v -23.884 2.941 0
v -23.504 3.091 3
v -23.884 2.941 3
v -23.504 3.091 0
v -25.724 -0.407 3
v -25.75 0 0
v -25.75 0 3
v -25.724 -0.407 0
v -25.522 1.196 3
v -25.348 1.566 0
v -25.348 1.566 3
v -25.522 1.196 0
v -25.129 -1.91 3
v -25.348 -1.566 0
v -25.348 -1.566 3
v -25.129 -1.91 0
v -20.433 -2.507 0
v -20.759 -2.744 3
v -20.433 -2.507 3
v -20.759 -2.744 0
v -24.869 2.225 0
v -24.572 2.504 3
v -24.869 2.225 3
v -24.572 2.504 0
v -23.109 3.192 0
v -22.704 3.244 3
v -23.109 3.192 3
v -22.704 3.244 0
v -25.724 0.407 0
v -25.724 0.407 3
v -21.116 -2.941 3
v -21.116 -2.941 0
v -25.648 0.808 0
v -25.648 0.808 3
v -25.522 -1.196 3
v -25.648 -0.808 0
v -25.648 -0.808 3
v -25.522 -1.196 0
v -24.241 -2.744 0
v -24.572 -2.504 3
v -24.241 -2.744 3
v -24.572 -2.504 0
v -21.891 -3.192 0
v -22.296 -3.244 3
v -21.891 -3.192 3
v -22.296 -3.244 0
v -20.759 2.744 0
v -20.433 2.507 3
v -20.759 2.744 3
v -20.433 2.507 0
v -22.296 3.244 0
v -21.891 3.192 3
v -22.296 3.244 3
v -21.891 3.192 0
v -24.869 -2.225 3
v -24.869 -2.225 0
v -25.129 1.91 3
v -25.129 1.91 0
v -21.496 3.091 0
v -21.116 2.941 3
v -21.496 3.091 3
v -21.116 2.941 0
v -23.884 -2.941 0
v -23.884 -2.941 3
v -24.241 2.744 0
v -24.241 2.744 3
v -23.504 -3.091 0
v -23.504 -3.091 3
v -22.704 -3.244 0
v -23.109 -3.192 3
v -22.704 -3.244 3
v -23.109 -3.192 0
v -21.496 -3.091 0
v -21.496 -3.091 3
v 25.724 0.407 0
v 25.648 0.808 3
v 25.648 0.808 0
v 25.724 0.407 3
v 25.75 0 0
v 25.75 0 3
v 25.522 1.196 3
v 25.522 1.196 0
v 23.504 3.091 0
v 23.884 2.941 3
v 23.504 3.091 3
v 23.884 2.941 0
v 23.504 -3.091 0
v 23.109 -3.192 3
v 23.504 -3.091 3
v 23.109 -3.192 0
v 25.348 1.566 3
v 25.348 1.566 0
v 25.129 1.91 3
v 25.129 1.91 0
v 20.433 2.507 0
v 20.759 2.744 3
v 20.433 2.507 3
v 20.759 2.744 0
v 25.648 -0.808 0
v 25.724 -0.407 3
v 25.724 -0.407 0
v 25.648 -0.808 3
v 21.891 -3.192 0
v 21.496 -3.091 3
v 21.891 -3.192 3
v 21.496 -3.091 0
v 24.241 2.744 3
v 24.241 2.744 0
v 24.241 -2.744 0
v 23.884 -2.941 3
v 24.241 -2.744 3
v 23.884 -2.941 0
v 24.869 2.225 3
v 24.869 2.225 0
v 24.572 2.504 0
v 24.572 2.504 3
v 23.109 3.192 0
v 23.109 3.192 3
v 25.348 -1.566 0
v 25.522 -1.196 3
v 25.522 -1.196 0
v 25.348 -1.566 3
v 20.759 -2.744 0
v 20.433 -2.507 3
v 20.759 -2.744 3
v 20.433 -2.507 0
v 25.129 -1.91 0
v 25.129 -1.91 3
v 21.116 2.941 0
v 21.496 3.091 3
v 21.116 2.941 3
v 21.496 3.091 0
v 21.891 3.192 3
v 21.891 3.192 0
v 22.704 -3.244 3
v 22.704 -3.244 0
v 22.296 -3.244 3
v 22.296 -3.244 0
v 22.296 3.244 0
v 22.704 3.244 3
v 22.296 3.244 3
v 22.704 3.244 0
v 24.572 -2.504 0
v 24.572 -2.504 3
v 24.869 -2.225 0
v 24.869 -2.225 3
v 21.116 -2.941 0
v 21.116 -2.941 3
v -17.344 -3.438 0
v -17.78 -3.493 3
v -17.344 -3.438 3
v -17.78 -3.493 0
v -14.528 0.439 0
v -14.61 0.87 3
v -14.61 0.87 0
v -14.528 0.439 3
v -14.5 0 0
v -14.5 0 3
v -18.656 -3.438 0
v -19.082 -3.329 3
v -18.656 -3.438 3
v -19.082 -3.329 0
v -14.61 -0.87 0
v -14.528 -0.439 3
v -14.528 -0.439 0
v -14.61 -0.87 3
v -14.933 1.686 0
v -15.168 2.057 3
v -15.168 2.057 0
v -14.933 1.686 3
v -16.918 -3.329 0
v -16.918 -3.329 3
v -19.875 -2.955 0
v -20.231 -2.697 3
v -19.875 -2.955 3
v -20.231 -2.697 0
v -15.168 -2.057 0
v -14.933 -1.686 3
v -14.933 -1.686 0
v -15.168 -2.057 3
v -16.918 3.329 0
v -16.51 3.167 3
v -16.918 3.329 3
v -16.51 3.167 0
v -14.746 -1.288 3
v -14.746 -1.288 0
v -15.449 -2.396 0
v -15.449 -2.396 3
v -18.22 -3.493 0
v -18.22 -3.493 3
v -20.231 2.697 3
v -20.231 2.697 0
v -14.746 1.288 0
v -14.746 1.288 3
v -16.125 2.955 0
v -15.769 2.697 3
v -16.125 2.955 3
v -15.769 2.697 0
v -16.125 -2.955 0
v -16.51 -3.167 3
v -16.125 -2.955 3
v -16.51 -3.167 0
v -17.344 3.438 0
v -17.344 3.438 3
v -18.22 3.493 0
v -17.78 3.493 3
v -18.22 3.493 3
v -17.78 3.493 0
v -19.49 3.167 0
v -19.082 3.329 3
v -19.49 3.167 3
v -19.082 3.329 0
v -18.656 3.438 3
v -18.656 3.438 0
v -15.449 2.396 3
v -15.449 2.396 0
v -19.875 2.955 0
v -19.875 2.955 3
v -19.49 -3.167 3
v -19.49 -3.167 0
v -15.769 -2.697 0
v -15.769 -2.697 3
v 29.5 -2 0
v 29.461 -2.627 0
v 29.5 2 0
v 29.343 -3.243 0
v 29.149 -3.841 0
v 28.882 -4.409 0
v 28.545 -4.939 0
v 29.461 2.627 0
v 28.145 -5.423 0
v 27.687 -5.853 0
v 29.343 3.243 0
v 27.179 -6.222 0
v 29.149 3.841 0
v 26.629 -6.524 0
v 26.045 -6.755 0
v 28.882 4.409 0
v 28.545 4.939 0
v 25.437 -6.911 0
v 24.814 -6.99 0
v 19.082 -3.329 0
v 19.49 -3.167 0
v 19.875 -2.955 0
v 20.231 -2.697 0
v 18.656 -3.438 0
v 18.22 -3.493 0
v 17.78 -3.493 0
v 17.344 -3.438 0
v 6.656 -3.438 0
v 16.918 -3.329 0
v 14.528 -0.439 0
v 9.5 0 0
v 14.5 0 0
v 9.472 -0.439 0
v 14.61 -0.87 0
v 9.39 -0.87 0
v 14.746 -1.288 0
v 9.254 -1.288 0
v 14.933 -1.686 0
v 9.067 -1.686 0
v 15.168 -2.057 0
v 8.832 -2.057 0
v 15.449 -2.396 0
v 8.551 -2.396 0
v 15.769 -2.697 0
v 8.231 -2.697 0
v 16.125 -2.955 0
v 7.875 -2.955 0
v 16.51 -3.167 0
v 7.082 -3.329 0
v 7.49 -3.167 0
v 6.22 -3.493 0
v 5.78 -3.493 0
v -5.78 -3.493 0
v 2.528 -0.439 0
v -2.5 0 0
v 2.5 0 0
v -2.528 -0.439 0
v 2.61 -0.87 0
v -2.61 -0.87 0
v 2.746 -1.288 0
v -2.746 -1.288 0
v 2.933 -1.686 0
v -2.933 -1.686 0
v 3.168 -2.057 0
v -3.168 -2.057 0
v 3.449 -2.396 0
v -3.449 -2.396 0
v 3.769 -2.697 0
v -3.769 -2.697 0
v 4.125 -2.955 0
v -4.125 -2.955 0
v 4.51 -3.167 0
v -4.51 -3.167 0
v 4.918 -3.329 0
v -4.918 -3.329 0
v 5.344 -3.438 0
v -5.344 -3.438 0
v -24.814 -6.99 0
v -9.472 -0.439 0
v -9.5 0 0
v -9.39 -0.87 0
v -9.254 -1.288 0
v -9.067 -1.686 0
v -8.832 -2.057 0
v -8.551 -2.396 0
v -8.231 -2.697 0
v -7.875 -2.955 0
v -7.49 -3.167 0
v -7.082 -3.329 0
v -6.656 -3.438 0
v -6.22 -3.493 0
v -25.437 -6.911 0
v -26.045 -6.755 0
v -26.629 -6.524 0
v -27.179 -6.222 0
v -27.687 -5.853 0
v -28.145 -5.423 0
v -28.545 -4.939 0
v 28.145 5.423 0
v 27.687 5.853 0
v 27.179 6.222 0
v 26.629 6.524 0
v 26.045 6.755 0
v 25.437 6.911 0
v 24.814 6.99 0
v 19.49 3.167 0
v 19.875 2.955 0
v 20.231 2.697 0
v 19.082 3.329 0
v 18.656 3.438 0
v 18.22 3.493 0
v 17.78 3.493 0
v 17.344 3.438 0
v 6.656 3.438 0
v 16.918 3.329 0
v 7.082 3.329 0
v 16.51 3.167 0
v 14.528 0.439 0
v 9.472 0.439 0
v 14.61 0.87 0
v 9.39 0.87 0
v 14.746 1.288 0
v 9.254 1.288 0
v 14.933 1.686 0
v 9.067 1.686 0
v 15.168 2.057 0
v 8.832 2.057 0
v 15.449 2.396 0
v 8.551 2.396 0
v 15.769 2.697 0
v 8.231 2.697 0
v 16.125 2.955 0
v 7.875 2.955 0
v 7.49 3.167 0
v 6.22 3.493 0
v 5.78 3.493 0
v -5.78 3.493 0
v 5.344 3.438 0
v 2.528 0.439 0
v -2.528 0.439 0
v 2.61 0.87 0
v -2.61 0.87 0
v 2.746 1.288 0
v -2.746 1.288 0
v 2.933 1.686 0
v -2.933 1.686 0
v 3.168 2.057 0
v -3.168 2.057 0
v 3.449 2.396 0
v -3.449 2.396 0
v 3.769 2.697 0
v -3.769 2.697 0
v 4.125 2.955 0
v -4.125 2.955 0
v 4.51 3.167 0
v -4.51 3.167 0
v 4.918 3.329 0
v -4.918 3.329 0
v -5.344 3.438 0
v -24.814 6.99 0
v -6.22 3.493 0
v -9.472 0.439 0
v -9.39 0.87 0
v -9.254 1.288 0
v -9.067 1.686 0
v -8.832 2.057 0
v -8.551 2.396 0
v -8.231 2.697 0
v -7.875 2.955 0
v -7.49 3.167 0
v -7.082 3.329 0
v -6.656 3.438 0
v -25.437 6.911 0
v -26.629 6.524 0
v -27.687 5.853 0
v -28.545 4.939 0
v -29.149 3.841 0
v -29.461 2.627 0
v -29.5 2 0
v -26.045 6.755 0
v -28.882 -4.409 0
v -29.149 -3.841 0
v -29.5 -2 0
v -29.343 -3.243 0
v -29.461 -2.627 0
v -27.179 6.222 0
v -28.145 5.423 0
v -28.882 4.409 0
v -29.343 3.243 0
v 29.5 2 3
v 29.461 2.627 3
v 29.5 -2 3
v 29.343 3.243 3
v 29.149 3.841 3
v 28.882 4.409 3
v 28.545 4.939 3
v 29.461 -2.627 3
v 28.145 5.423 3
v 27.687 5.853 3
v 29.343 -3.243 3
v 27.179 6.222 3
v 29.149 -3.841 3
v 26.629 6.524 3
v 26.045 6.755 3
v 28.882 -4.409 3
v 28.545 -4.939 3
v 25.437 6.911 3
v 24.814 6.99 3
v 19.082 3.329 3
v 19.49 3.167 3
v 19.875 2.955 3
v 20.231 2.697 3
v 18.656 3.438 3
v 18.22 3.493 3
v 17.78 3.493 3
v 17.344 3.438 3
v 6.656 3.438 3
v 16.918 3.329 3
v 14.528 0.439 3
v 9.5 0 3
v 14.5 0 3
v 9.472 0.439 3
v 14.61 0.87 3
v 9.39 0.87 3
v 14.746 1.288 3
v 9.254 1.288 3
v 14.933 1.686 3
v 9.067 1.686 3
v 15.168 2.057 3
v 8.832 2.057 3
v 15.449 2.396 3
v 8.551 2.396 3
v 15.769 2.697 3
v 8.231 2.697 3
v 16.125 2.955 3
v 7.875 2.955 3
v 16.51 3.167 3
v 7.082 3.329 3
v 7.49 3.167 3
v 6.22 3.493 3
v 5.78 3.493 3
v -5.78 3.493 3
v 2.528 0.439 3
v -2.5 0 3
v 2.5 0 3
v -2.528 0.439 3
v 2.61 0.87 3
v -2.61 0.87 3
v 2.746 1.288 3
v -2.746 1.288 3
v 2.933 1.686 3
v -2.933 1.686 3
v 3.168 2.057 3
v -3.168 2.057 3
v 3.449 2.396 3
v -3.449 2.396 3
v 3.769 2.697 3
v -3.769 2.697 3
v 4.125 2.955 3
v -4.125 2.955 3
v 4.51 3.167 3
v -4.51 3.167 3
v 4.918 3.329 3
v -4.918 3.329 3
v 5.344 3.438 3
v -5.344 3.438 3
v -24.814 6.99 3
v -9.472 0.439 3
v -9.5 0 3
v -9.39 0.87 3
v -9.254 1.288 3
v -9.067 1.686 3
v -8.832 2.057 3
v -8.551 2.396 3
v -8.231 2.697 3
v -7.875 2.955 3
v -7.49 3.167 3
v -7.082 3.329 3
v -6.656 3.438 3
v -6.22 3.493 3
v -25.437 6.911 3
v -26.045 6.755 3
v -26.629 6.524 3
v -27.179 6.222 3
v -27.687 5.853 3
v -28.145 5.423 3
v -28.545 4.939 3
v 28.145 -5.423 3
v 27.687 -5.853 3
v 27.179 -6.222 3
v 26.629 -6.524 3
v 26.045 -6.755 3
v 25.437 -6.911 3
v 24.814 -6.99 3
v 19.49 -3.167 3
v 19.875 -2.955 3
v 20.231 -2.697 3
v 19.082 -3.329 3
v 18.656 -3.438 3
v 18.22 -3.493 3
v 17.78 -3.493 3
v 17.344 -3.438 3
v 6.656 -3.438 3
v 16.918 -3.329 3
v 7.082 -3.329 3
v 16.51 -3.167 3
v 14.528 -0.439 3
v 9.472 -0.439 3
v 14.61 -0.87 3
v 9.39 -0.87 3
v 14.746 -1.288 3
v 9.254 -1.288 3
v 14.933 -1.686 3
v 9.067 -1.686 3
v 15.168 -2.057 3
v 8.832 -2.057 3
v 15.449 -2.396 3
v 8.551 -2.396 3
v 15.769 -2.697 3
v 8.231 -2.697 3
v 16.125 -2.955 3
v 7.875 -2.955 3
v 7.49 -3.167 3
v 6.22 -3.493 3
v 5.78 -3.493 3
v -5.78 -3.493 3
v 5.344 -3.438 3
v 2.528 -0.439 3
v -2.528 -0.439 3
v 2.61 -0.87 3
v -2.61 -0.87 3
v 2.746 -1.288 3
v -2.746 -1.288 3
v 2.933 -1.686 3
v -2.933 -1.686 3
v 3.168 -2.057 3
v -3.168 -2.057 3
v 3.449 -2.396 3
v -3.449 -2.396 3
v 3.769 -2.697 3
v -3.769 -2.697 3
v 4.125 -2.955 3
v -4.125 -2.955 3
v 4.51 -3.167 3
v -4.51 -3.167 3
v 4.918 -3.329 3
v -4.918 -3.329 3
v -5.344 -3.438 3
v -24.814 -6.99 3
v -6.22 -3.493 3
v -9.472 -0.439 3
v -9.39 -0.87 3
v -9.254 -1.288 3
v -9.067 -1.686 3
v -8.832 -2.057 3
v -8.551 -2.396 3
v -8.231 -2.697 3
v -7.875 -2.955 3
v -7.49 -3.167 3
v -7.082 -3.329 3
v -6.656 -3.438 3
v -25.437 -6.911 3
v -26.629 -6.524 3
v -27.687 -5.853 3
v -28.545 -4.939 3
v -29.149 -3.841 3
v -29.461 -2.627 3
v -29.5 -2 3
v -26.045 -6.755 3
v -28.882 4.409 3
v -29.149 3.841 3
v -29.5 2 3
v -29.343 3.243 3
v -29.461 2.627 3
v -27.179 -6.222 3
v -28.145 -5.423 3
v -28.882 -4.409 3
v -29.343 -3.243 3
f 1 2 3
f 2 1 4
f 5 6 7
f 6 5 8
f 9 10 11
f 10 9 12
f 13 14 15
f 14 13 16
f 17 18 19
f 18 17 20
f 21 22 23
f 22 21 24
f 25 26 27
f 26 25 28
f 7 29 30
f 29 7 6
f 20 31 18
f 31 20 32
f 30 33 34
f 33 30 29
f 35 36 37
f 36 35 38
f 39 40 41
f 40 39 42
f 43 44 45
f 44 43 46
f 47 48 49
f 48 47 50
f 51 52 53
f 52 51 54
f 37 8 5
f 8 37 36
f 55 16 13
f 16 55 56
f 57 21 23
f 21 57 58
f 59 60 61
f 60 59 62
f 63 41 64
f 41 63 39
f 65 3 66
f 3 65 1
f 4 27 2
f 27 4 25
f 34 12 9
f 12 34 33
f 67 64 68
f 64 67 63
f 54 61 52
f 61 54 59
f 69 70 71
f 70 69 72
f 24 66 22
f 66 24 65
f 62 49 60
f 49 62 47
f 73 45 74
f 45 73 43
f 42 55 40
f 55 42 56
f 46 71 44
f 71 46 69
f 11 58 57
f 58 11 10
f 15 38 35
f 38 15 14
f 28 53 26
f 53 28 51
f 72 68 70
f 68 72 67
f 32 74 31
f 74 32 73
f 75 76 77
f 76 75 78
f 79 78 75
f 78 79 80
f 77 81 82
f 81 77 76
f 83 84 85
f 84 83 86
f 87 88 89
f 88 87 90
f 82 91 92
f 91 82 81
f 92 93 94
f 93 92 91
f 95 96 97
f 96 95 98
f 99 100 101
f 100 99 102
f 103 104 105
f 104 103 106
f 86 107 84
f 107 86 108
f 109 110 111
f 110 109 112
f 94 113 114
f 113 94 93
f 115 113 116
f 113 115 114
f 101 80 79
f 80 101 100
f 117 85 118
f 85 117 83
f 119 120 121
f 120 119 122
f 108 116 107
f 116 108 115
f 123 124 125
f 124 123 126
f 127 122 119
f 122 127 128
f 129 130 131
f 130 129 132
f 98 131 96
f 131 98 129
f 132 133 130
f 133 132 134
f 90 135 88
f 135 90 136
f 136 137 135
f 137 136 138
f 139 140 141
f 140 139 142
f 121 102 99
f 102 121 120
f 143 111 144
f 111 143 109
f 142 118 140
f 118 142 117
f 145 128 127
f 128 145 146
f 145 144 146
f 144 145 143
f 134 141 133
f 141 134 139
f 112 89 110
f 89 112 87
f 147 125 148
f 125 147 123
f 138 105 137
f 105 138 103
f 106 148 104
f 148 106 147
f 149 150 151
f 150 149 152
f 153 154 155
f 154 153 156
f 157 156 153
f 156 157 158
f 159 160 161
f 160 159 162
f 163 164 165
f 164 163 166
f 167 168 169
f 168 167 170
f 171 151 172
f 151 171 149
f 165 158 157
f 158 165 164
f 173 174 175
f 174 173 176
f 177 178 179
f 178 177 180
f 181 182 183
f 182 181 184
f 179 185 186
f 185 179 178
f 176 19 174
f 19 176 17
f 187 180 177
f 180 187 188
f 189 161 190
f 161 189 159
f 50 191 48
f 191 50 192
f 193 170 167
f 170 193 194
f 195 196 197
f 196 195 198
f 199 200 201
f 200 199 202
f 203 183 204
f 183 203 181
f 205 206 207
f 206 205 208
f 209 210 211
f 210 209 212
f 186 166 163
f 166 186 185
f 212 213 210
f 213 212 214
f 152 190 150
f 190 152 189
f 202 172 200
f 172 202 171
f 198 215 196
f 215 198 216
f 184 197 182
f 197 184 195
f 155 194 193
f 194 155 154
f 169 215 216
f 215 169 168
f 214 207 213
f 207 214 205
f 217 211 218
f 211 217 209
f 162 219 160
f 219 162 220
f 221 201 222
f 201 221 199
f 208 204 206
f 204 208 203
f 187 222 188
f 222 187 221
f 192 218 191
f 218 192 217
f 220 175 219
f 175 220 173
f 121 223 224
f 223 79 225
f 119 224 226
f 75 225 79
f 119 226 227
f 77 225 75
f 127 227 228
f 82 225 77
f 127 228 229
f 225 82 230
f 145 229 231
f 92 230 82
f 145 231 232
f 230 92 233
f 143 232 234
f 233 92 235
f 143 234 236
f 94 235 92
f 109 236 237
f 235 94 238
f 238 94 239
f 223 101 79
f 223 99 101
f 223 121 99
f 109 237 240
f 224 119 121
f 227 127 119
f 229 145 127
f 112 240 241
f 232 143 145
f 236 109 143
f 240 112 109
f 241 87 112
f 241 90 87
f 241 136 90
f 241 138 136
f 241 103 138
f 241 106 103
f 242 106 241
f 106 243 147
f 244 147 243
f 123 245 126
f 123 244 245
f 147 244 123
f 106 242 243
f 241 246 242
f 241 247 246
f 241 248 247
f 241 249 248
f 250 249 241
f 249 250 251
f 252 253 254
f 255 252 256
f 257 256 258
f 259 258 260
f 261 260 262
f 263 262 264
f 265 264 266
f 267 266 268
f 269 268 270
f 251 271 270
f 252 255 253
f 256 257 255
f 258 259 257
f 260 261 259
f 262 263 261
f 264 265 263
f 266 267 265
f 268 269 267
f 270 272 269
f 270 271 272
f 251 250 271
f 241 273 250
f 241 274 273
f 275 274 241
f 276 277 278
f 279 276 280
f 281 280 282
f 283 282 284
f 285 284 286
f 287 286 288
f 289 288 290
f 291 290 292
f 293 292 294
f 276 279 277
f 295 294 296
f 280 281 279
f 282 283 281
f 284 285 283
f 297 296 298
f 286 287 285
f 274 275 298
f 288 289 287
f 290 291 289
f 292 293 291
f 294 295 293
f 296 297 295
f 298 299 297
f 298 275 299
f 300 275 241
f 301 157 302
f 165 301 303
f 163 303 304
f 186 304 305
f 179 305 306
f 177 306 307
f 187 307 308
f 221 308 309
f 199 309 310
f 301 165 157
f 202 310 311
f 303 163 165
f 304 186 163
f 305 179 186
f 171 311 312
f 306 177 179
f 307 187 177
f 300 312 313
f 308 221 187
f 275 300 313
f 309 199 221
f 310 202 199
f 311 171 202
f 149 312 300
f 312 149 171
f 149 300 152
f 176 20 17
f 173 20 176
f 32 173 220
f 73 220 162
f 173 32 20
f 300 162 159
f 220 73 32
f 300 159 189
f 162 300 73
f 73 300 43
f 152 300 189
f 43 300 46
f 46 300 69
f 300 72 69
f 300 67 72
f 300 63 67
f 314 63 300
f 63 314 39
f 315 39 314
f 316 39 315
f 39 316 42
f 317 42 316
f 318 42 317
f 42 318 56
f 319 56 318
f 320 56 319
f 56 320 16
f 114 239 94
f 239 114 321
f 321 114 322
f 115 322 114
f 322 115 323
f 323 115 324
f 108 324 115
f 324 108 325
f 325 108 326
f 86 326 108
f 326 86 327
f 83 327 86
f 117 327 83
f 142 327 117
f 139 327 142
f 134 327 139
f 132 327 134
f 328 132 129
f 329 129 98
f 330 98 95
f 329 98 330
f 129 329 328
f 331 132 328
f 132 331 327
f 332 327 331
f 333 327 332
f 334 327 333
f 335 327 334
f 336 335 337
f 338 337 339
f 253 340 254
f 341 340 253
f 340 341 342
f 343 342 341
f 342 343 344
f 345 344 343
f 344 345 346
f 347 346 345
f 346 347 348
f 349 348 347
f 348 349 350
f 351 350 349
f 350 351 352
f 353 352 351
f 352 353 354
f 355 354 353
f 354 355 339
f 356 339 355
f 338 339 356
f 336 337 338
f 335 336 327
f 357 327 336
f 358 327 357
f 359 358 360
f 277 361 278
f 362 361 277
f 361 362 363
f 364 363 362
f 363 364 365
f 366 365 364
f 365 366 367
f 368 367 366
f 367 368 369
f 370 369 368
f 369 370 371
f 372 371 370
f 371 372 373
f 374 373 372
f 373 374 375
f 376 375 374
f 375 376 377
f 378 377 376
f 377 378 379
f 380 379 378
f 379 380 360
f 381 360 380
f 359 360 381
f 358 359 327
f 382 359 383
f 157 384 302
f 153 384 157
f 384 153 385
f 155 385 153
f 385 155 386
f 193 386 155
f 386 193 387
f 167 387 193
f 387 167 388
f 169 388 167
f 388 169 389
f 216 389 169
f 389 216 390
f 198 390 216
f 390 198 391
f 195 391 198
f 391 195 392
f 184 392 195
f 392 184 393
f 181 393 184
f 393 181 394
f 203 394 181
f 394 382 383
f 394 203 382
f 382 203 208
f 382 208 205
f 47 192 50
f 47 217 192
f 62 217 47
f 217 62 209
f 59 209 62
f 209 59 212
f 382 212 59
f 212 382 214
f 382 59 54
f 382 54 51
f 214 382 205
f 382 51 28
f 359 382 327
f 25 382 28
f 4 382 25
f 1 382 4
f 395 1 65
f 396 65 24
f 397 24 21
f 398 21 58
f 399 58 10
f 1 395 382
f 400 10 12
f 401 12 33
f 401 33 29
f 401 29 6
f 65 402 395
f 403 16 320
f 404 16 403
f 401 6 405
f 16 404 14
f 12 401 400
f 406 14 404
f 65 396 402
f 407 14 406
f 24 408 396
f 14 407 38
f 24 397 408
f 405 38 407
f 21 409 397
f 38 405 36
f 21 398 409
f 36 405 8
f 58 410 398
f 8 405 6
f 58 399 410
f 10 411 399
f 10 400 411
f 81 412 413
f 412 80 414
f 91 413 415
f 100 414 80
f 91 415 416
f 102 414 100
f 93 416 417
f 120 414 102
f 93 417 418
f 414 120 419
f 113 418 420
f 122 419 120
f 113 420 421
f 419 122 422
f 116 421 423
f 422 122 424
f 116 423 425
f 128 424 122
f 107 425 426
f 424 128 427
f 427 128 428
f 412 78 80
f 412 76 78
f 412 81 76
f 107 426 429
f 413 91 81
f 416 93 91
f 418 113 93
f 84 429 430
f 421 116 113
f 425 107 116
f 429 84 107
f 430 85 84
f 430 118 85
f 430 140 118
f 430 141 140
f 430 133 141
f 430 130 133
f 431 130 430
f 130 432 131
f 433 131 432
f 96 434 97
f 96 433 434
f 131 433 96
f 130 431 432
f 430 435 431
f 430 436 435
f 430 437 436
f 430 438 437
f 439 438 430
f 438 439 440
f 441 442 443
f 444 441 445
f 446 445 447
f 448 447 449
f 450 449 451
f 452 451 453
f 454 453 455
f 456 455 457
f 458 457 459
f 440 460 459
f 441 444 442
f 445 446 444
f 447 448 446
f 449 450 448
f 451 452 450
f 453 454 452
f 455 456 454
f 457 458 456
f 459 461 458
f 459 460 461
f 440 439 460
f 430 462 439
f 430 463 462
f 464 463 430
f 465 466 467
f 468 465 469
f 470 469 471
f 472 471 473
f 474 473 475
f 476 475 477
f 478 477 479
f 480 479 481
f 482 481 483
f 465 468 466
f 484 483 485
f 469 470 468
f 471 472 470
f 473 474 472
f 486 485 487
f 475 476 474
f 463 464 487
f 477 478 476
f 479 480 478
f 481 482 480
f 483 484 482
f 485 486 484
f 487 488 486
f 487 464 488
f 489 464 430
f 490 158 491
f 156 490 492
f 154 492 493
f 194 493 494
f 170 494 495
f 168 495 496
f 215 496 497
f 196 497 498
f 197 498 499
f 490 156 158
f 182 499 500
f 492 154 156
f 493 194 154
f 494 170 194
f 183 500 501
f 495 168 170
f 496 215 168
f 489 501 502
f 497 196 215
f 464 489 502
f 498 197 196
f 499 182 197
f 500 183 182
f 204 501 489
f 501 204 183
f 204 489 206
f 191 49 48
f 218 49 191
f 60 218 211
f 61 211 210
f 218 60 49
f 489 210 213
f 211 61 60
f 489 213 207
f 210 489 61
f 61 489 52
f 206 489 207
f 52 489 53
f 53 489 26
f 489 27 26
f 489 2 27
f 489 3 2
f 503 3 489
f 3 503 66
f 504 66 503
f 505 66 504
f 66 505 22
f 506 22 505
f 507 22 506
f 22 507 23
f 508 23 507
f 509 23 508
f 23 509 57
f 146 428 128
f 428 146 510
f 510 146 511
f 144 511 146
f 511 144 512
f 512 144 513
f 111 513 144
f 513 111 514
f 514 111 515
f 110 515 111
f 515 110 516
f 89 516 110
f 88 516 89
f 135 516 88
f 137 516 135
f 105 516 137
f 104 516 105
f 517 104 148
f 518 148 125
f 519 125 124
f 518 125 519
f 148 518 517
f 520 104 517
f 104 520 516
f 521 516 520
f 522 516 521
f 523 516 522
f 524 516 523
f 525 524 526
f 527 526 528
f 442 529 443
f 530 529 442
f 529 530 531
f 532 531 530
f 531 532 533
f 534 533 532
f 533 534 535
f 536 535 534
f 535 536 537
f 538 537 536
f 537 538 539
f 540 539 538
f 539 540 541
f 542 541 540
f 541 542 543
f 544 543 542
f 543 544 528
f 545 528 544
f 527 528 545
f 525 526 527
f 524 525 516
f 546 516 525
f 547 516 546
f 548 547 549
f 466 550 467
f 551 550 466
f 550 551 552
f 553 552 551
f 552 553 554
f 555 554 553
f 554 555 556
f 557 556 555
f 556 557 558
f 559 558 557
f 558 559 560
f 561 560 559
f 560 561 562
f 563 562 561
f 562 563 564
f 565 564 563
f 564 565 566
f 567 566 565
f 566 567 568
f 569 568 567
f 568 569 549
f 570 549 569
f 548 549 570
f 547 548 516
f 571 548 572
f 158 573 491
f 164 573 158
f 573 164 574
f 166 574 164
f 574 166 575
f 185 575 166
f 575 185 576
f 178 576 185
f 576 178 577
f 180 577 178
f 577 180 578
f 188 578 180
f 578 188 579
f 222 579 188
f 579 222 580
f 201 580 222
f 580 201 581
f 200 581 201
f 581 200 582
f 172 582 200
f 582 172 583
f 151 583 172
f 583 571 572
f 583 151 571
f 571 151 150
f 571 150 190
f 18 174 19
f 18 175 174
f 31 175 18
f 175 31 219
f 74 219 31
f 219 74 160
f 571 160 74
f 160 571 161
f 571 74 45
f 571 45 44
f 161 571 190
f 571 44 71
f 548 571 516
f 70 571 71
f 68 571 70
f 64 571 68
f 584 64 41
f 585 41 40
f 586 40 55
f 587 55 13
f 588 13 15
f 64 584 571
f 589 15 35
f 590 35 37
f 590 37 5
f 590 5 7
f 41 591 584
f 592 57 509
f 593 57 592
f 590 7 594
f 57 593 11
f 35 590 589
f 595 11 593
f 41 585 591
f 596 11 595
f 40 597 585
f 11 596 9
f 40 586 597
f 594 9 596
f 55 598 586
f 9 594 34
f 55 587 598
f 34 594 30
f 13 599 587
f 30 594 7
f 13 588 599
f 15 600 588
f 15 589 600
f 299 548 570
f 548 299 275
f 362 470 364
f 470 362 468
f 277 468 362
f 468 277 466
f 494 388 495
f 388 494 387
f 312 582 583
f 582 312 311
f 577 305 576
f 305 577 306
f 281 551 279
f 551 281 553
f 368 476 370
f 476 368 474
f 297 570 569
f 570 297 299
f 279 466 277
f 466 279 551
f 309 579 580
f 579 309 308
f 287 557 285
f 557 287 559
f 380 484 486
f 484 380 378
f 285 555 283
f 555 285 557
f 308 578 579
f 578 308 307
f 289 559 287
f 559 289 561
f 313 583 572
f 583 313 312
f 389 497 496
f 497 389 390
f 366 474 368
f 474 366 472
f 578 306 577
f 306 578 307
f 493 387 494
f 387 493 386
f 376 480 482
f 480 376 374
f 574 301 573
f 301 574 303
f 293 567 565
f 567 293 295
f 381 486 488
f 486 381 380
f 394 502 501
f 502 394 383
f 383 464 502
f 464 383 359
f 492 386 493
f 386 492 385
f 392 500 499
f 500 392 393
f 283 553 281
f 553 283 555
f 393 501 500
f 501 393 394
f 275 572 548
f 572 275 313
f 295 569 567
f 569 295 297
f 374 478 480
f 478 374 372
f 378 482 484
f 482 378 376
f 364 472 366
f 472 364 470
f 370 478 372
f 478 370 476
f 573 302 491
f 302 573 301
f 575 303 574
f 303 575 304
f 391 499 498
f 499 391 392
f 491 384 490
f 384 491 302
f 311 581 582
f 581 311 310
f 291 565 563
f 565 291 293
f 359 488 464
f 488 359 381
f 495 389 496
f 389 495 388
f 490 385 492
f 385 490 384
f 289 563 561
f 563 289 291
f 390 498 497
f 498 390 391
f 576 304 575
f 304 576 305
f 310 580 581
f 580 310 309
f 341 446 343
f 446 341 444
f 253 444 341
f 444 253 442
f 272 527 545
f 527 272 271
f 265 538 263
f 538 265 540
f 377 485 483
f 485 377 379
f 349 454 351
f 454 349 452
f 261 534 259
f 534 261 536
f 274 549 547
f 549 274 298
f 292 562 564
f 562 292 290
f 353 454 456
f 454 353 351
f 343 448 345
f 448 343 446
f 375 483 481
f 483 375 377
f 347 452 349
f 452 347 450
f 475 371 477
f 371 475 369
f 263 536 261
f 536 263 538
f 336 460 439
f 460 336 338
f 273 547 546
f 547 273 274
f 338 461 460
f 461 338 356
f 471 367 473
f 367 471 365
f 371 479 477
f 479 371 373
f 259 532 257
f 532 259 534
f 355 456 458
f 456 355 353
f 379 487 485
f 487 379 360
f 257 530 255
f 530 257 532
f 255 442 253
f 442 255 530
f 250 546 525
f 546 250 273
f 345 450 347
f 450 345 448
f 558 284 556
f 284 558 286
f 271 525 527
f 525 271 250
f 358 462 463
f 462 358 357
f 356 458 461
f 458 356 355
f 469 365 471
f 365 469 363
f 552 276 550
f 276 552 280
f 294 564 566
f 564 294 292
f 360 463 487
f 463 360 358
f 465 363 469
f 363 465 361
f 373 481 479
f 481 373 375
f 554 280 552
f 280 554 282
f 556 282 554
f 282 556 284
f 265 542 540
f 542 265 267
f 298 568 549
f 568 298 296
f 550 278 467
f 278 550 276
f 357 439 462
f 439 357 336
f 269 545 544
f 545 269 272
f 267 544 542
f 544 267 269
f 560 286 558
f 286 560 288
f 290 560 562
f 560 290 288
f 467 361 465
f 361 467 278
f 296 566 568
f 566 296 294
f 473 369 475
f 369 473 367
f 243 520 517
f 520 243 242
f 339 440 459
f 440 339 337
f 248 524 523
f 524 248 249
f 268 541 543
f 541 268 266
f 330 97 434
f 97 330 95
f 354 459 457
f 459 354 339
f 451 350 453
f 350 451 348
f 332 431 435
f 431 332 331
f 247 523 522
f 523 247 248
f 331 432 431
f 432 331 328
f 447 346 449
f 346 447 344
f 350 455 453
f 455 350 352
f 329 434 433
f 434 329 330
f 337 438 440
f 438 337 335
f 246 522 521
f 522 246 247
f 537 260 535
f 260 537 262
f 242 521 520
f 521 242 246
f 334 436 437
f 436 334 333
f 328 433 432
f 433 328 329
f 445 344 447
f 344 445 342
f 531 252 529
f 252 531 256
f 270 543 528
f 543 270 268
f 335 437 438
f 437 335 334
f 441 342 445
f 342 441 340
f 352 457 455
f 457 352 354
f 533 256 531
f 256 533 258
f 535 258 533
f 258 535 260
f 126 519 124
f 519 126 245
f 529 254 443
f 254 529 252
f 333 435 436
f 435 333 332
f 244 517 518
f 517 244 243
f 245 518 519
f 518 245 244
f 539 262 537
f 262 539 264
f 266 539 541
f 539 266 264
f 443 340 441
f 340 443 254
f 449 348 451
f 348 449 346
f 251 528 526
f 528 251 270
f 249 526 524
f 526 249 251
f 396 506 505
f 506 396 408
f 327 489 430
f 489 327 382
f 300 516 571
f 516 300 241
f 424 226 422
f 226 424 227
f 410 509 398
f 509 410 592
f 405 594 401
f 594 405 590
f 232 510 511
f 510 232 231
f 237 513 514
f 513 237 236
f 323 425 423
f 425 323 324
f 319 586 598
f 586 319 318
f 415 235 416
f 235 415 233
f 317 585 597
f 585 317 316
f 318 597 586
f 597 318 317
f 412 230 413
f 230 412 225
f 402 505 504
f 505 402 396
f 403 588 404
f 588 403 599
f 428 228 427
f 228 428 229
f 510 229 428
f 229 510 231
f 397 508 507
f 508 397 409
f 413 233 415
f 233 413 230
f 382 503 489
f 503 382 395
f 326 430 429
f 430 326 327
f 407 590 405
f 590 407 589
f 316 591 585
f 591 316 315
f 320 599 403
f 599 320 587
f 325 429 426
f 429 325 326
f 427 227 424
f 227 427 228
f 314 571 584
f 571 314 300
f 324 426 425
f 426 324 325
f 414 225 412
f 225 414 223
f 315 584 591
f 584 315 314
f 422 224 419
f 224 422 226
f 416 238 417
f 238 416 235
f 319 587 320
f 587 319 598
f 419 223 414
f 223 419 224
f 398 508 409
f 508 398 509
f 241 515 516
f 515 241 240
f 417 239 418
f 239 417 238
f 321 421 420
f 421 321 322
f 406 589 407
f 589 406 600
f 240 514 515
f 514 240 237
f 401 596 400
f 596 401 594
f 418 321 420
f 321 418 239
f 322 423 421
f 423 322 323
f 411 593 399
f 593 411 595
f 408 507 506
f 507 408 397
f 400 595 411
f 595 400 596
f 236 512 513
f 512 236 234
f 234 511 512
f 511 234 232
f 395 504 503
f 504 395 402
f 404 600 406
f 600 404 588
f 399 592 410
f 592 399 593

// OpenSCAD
$fn = 50;

difference() {
	union() {
		hull() {
			translate(v = [-24.5, 2.0, 0]) {
				cylinder(h = 3, r = 5);
			}
			translate(v = [24.5, 2.0, 0]) {
				cylinder(h = 3, r = 5);
			}
			translate(v = [-24.5, -2.0, 0]) {
				cylinder(h = 3, r = 5);
			}
			translate(v = [24.5, -2.0, 0]) {
				cylinder(h = 3, r = 5);
			}
		}
	}
	union() {
		translate(v = [-22.5, 0.0, -100.0]) {
			cylinder(h = 200, r = 3.25);
		}
		translate(v = [22.5, 0.0, -100.0]) {
			cylinder(h = 200, r = 3.25);
		}
		translate(v = [-22.5, 0.0, -100.0]) {
			cylinder(h = 200, r = 1.8);
		}
		translate(v = [22.5, 0.0, -100.0]) {
			cylinder(h = 200, r = 1.8);
		}
		translate(v = [-18.0, 0, 0.0]) {
			cylinder(h = 3, r = 3.5);
		}
		translate(v = [-6.0, 0, 0.0]) {
			cylinder(h = 3, r = 3.5);
		}
		translate(v = [6.0, 0, 0.0]) {
			cylinder(h = 3, r = 3.5);
		}
		translate(v = [18.0, 0, 0.0]) {
			cylinder(h = 3, r = 3.5);
		}
	}
}
